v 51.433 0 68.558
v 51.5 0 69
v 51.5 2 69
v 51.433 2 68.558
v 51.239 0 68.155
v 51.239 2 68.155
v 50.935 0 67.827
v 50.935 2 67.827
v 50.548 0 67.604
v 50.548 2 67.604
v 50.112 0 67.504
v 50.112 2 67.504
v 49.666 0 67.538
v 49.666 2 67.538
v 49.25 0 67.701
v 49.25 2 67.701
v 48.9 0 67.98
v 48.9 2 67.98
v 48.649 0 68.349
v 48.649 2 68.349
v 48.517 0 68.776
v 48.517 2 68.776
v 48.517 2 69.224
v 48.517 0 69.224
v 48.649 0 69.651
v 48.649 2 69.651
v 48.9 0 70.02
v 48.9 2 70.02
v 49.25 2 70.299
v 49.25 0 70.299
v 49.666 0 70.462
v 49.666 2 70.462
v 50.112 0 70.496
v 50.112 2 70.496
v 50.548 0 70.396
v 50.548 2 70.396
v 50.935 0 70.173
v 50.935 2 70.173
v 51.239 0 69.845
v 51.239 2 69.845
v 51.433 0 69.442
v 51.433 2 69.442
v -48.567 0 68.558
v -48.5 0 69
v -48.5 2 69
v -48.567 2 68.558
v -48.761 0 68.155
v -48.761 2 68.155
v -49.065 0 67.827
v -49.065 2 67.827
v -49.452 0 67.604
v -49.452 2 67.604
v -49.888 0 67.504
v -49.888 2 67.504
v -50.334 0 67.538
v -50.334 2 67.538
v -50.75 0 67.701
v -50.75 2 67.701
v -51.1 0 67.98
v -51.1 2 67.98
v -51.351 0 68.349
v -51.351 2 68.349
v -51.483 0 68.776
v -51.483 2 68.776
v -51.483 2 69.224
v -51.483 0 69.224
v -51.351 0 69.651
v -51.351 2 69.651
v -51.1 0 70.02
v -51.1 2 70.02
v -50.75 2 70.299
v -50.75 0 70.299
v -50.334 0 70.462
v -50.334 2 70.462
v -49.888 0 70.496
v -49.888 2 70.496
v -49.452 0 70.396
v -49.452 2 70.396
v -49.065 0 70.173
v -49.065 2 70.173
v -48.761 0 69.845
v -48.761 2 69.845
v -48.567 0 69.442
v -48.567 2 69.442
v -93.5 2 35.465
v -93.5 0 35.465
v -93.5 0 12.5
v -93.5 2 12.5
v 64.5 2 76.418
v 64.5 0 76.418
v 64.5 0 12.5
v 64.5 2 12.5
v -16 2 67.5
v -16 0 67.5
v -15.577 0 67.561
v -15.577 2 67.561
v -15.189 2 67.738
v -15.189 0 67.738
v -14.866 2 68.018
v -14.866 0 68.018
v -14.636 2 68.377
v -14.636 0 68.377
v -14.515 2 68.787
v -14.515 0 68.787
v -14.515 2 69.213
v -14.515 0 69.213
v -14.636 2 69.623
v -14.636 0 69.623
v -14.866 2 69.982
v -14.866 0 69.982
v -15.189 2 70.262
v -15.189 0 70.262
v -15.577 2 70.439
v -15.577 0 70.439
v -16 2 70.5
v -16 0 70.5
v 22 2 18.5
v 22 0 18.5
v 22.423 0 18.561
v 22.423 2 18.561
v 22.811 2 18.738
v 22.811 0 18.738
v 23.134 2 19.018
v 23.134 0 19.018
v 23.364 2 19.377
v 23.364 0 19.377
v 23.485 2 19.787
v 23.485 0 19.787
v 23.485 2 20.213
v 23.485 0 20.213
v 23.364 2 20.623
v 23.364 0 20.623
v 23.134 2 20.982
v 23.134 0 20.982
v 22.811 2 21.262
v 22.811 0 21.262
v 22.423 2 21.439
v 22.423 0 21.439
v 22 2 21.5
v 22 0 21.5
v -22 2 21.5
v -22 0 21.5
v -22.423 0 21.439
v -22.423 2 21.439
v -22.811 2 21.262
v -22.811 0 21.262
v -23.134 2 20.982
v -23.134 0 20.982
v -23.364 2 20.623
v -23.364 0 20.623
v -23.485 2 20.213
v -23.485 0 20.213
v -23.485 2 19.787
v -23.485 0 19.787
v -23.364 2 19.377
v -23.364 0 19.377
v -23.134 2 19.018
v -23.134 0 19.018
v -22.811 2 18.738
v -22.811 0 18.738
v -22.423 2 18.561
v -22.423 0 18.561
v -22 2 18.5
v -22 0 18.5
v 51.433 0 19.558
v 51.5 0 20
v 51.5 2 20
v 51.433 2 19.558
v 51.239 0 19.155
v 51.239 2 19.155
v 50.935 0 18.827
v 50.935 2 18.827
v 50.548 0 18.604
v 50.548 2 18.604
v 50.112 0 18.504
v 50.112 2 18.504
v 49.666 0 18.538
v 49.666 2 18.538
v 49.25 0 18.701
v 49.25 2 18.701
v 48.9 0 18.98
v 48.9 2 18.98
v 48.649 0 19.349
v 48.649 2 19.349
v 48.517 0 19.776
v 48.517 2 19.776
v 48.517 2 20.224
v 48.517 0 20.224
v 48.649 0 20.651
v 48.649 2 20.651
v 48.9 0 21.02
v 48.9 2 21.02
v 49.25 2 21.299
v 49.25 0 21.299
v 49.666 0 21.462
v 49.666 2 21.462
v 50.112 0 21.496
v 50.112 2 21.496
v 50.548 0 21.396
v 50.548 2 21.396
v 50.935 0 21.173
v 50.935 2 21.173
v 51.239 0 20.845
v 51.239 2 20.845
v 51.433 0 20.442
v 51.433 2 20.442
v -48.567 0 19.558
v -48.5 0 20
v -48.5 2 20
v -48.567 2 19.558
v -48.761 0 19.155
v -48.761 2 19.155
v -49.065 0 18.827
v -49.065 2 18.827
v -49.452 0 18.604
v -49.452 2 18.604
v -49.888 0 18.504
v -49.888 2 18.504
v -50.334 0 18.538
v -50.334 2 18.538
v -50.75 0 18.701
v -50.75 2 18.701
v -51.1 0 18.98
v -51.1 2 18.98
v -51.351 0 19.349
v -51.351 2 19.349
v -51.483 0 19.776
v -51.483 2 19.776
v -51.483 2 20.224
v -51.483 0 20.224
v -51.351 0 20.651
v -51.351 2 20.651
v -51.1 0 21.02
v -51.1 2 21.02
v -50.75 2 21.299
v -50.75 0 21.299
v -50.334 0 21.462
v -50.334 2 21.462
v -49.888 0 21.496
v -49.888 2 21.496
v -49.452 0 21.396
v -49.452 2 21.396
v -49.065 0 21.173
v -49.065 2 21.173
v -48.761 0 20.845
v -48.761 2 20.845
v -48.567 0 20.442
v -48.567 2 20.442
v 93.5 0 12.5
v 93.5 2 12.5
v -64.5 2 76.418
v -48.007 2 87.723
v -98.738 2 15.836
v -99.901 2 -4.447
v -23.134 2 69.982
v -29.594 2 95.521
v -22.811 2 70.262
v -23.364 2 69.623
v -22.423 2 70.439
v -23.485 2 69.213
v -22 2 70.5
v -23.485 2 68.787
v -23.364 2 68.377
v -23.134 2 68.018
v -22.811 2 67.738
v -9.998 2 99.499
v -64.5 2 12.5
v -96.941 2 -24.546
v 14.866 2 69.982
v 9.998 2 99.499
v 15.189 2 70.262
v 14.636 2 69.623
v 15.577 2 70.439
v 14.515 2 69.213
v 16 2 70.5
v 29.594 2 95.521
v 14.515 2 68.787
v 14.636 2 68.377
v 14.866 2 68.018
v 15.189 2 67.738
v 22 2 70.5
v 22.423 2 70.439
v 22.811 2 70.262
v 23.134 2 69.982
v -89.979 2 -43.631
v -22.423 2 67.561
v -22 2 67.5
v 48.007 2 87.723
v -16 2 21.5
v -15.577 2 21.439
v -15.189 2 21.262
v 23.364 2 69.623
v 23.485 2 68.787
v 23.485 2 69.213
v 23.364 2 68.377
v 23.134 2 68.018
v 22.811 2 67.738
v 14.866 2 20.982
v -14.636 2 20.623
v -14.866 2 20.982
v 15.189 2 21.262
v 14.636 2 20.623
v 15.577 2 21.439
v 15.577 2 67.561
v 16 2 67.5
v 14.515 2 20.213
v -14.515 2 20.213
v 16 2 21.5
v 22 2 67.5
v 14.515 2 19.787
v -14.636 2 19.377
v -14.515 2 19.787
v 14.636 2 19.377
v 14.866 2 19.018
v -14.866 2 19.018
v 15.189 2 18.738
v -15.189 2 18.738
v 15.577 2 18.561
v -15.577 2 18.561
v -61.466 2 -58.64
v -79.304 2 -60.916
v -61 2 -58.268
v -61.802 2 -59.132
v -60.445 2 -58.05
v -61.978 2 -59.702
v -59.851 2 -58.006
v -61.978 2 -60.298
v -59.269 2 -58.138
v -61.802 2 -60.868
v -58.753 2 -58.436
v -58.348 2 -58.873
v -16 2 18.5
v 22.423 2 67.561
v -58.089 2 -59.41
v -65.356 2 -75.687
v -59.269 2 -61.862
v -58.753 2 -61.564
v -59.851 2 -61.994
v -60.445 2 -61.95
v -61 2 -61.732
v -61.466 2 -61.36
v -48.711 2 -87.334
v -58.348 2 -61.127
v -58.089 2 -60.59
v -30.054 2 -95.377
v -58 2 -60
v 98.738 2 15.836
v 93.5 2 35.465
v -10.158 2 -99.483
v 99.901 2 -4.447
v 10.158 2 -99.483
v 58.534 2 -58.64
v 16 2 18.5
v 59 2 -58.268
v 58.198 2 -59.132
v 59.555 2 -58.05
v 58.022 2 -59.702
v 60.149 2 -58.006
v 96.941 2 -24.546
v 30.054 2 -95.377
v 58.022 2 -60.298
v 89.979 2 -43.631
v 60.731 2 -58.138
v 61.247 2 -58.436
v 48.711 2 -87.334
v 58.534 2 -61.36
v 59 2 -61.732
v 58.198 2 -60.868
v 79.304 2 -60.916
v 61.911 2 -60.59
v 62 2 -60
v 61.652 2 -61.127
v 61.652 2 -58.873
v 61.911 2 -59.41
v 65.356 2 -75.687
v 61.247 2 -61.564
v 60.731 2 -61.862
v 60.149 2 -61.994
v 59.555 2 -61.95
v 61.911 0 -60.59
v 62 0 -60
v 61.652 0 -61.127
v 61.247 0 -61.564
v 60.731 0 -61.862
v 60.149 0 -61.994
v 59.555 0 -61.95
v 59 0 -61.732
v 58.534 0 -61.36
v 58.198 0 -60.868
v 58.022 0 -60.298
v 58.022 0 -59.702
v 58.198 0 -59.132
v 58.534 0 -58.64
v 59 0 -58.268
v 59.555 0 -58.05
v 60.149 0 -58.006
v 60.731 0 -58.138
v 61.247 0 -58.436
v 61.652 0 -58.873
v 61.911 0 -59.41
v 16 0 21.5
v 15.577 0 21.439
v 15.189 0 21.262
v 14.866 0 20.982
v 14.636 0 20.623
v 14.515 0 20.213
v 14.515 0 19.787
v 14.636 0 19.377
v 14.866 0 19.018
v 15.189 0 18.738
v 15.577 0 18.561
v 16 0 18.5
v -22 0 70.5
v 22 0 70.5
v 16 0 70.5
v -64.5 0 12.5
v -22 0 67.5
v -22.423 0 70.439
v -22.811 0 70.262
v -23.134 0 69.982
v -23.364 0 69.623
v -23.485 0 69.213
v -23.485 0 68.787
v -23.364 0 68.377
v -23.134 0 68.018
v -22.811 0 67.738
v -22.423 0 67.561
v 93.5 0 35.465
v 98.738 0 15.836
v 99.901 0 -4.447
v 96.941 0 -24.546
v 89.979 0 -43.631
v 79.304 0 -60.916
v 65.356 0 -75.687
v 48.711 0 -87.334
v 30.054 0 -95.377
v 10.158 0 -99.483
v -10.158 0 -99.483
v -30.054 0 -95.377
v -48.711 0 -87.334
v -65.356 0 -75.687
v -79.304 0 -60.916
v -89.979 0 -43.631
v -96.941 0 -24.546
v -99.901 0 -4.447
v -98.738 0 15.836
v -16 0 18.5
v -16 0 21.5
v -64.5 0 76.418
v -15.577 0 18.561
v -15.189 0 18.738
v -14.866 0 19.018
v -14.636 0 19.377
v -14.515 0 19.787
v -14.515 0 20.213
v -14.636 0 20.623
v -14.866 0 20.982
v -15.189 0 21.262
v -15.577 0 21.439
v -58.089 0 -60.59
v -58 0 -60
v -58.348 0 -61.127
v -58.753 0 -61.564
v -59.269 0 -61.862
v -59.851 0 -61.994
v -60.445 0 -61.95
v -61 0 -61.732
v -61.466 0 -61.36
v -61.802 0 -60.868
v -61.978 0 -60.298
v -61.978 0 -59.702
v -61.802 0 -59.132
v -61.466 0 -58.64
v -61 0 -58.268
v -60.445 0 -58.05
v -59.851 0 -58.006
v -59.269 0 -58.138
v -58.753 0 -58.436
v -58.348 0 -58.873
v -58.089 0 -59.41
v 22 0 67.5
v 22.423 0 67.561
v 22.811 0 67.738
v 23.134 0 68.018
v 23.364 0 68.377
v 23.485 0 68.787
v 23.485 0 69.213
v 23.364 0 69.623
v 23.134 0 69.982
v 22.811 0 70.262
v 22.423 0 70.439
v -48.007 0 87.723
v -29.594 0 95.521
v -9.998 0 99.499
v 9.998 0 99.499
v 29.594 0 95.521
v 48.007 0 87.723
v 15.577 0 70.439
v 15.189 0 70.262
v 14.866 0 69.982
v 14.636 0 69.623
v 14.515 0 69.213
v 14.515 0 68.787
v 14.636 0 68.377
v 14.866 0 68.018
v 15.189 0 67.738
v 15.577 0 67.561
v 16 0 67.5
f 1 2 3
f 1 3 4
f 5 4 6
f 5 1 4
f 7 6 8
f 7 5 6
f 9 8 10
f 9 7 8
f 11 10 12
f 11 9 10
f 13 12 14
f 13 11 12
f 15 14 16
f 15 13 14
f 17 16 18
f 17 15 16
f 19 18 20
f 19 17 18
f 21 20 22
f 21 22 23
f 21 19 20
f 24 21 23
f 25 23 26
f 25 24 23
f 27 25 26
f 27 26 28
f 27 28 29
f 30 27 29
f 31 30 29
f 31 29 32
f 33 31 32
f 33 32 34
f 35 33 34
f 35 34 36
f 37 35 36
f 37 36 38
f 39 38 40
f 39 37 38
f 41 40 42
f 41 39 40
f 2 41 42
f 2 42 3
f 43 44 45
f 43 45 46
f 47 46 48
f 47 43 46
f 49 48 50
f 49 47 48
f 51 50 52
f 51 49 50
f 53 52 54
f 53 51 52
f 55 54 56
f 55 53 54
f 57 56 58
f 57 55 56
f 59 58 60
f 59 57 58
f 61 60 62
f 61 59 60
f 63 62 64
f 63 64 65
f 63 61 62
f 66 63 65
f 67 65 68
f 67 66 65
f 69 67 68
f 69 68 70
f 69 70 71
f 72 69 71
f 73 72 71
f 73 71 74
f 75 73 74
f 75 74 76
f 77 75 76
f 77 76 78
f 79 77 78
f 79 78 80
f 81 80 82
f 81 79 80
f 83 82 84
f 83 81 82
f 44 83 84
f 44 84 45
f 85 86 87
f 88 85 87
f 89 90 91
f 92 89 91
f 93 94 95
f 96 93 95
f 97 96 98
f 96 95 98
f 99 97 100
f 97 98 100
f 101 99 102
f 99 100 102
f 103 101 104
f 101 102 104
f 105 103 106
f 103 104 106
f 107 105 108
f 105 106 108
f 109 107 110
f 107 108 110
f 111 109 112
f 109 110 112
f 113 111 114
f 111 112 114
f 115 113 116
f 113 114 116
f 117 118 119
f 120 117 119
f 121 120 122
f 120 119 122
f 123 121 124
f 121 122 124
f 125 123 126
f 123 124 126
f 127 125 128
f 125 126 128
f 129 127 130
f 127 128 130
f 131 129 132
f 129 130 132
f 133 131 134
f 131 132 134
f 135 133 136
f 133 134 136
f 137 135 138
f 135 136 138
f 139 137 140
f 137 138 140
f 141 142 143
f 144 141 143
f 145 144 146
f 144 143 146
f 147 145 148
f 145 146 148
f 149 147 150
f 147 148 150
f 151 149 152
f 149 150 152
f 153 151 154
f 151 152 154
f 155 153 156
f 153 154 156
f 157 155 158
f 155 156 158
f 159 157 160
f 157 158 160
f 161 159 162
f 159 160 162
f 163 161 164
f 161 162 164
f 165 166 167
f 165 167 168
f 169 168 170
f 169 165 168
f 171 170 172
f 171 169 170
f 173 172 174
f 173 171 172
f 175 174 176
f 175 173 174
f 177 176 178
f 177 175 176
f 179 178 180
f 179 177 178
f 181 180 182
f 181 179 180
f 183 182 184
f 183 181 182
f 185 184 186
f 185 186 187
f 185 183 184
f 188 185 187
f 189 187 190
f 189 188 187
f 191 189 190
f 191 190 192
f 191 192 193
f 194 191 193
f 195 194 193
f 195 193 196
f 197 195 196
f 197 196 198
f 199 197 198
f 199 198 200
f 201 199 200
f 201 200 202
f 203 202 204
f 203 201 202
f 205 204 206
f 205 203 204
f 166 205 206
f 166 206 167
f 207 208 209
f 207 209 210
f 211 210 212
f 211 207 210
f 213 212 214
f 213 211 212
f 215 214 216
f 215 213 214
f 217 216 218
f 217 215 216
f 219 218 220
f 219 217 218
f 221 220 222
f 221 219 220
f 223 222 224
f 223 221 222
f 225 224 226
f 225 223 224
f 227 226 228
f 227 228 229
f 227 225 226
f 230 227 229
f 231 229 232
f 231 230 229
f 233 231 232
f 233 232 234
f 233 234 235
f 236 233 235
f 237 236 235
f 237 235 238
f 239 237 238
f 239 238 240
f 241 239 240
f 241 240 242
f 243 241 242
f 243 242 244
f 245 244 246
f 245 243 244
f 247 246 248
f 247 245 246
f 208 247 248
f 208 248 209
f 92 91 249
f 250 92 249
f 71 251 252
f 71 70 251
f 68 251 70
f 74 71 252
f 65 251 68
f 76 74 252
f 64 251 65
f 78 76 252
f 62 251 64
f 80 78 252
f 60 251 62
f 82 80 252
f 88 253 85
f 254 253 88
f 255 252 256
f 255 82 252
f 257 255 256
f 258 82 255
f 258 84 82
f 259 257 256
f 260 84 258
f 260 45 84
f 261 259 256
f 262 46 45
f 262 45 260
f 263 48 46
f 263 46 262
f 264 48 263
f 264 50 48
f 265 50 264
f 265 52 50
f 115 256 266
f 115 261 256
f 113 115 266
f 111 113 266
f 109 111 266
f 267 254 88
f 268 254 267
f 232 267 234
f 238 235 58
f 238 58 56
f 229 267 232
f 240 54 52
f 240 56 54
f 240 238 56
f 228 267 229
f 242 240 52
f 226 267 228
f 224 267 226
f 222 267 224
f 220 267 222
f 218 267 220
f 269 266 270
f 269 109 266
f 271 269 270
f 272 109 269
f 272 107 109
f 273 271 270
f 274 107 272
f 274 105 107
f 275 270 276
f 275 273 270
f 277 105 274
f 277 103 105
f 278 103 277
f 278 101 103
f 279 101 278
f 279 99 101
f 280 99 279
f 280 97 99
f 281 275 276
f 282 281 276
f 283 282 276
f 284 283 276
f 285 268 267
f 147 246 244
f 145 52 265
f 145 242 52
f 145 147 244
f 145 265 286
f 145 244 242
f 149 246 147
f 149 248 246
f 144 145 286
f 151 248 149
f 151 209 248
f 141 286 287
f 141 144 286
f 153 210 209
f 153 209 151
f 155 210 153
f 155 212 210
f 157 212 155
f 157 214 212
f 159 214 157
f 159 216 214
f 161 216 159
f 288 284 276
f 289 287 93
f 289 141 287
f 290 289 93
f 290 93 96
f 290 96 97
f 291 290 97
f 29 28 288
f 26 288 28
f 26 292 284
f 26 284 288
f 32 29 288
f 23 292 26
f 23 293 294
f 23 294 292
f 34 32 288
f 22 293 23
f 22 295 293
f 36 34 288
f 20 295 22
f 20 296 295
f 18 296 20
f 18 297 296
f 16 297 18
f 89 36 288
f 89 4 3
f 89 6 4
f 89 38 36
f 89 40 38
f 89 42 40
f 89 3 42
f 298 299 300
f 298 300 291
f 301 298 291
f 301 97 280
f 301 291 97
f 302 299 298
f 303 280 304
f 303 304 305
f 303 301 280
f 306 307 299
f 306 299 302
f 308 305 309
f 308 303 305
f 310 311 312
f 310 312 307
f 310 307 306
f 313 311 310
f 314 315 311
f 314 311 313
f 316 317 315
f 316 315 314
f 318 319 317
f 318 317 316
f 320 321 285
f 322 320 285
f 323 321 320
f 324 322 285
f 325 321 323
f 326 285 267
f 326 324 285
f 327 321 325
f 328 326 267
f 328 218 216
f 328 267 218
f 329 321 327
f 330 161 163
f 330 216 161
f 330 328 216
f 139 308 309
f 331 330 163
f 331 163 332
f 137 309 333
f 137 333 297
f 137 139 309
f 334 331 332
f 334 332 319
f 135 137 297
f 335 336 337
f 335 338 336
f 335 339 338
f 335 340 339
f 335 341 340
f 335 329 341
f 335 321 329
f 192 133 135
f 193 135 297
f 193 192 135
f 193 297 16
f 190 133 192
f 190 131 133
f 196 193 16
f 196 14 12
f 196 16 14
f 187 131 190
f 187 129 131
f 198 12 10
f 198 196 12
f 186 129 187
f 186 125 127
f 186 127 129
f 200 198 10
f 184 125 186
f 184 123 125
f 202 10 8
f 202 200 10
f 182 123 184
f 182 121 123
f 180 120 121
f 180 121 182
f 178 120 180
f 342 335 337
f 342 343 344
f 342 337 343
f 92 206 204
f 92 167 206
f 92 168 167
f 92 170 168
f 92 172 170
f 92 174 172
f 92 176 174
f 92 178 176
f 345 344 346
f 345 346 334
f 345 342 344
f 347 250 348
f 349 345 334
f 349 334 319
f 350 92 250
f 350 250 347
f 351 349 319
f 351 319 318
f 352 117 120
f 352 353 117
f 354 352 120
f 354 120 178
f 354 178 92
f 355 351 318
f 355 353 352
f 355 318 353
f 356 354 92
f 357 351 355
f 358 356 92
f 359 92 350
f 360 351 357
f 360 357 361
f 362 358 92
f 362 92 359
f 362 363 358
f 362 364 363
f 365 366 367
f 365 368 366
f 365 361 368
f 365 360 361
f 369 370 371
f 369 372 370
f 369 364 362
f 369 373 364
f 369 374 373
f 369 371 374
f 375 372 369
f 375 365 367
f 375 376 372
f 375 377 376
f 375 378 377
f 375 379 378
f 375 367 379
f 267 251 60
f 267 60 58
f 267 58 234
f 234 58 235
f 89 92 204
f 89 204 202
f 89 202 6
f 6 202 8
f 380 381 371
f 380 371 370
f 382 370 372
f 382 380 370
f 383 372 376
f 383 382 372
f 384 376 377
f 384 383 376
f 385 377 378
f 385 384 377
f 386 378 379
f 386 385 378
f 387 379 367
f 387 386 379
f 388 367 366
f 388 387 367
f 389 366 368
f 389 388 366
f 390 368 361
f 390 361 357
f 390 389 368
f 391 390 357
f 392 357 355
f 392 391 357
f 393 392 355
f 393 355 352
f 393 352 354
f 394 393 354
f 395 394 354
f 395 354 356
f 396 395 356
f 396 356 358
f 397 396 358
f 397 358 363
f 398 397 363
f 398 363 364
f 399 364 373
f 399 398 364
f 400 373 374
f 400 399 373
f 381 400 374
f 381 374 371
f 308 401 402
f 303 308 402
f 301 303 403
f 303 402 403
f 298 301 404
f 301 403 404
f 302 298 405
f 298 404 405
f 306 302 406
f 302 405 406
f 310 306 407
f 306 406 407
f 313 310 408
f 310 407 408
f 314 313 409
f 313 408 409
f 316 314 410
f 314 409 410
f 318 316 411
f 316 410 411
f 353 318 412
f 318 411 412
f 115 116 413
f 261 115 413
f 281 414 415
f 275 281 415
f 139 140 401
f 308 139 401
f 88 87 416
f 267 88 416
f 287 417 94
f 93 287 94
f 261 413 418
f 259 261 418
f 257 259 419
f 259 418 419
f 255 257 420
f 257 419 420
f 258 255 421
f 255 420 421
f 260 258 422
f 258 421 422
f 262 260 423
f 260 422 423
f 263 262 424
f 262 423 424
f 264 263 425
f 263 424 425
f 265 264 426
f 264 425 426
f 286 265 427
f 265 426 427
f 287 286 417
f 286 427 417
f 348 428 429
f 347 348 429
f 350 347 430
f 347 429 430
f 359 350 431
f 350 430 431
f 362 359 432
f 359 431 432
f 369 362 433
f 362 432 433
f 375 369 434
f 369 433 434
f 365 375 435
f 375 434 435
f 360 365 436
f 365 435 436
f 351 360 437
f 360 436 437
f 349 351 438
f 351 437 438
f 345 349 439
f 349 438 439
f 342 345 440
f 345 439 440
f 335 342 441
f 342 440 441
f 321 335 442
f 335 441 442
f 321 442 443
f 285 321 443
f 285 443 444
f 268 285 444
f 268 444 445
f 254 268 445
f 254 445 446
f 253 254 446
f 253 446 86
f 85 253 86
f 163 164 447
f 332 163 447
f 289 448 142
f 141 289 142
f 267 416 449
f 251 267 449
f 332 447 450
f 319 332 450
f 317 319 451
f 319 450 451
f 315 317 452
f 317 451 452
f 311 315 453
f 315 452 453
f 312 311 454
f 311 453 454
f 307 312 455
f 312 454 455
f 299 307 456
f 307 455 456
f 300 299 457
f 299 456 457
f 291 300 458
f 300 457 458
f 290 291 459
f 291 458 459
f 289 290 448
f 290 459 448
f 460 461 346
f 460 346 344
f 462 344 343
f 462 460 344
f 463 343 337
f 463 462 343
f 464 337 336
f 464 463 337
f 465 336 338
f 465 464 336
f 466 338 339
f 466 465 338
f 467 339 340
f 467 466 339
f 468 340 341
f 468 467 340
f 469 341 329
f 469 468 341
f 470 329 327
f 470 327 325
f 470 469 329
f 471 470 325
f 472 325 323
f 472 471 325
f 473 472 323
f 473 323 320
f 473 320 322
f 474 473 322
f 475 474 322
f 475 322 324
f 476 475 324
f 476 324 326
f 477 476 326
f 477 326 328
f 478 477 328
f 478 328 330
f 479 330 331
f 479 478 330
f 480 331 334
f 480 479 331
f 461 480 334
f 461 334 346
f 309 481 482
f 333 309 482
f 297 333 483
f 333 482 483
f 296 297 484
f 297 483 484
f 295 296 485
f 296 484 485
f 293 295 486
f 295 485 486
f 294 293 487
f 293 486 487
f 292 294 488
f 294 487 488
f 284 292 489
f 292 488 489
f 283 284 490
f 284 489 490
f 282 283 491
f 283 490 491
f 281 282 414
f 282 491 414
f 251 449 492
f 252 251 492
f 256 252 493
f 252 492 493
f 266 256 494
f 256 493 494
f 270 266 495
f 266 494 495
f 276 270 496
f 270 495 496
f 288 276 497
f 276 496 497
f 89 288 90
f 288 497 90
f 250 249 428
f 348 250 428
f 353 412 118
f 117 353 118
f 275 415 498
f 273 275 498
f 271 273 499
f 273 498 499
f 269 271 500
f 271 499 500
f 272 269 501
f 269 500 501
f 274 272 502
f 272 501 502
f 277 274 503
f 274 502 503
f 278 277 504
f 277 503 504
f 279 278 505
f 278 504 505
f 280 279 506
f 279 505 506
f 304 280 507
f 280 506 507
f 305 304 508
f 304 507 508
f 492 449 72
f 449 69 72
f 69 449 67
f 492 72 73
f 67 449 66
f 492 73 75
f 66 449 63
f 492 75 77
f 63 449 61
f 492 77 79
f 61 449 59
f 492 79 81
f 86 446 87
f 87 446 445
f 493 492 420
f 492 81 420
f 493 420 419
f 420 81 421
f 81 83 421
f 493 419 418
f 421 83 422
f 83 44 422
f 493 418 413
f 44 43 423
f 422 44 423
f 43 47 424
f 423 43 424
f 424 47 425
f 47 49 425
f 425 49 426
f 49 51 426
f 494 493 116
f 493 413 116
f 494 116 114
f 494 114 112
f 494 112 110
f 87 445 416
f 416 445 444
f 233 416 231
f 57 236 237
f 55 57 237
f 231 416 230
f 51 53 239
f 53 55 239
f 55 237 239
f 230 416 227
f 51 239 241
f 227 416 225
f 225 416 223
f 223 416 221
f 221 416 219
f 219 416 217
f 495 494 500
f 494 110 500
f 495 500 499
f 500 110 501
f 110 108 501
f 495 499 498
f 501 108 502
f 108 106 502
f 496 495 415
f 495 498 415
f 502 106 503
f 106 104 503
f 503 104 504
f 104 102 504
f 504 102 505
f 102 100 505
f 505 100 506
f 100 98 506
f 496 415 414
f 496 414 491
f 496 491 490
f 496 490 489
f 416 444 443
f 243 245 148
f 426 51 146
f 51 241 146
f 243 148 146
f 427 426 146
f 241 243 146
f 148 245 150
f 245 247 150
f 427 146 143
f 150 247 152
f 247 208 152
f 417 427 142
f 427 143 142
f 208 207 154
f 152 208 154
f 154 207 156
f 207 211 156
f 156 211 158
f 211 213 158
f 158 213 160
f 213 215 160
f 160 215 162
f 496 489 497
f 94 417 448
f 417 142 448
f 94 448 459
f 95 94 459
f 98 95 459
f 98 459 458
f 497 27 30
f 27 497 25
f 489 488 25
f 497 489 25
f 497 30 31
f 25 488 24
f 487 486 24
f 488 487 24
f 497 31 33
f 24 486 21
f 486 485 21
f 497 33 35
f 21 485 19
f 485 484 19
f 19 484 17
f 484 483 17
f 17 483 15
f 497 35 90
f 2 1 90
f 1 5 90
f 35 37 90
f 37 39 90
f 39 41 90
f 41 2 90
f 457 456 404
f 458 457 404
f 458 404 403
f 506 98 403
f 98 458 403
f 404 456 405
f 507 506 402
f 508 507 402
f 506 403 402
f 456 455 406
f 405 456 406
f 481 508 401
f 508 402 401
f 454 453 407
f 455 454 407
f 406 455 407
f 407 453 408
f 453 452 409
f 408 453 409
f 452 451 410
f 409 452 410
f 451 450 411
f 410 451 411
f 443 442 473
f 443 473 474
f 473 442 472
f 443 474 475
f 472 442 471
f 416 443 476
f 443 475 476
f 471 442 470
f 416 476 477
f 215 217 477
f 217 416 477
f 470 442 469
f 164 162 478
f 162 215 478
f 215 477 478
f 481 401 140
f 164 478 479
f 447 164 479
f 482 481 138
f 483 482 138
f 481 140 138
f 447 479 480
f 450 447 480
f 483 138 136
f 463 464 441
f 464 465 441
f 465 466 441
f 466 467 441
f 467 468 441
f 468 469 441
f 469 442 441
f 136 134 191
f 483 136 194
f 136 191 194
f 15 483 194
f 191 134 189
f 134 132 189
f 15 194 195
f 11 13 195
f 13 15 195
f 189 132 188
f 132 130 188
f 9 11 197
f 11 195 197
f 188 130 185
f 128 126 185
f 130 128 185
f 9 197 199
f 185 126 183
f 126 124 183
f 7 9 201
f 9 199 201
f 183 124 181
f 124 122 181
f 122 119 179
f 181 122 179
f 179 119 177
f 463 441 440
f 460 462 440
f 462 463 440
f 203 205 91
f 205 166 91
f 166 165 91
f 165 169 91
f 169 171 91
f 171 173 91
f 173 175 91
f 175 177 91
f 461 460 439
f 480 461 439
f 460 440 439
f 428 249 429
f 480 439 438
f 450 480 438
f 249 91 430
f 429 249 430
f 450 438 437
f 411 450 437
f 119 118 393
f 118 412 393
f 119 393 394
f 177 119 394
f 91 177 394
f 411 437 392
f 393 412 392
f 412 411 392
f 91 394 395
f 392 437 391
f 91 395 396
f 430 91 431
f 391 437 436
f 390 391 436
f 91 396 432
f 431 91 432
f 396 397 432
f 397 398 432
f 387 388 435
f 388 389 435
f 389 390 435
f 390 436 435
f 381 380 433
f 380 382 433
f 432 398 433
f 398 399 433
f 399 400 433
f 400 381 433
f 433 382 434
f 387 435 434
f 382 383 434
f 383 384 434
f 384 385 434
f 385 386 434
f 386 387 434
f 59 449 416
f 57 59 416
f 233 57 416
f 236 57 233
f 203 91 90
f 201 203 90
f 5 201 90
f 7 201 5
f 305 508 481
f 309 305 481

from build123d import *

# Parameters (mm, degrees)
SKETCH1_R           = 1.5
SKETCH1_R_2         = 2
BOSS_EXTRUDE1_DEPTH = 2


with BuildPart() as part:
    # Sketch1 → Boss-Extrude1 (new body)
    with BuildSketch(Plane(origin=(0, 0, 0), x_dir=(1, 0, 0), z_dir=(0, 1, 0))):
        with BuildLine():
            Line((-93.5, -35.464771253), (-93.5, -12.5))
            Line((-93.5, -12.5), (-64.5, -12.5))
            Line((-64.5, -12.5), (-64.5, -76.418256981))
            ThreePointArc((-64.5, -76.418256981), (0, -100), (64.5, -76.418256981))
            Line((64.5, -76.418256981), (64.5, -12.5))
            Line((64.5, -12.5), (93.5, -12.5))
            Line((93.5, -12.5), (93.5, -35.464771253))
            ThreePointArc((93.5, -35.464771253), (0, 100), (-93.5, -35.464771253))
        make_face()
        with Locations((-50, -69)):
            Circle(SKETCH1_R, mode=Mode.SUBTRACT)
        with BuildLine():
            Line((-22, -67.5), (-16, -67.5))
            ThreePointArc((-16, -67.5), (-14.5, -69), (-16, -70.5))
            Line((-16, -70.5), (-22, -70.5))
            ThreePointArc((-22, -70.5), (-23.5, -69), (-22, -67.5))
        make_face(mode=Mode.SUBTRACT)
        with Locations((-50, -20)):
            Circle(SKETCH1_R, mode=Mode.SUBTRACT)
        with BuildLine():
            ThreePointArc((-16, -18.5), (-14.5, -20), (-16, -21.5))
            Line((-16, -21.5), (-22, -21.5))
            ThreePointArc((-22, -21.5), (-23.5, -20), (-22, -18.5))
            Line((-22, -18.5), (-16, -18.5))
        make_face(mode=Mode.SUBTRACT)
        with BuildLine():
            ThreePointArc((16, -70.5), (14.5, -69), (16, -67.5))
            Line((16, -67.5), (22, -67.5))
            ThreePointArc((22, -67.5), (23.5, -69), (22, -70.5))
            Line((22, -70.5), (16, -70.5))
        make_face(mode=Mode.SUBTRACT)
        with Locations((50, -69)):
            Circle(SKETCH1_R, mode=Mode.SUBTRACT)
        with BuildLine():
            Line((22, -21.5), (16, -21.5))
            ThreePointArc((16, -21.5), (14.5, -20), (16, -18.5))
            Line((16, -18.5), (22, -18.5))
            ThreePointArc((22, -18.5), (23.5, -20), (22, -21.5))
        make_face(mode=Mode.SUBTRACT)
        with Locations((50, -20)):
            Circle(SKETCH1_R, mode=Mode.SUBTRACT)
        with Locations((-60, 60)):
            Circle(SKETCH1_R_2, mode=Mode.SUBTRACT)
        with Locations((60, 60)):
            Circle(SKETCH1_R_2, mode=Mode.SUBTRACT)
    extrude(amount=BOSS_EXTRUDE1_DEPTH)


solid = part.part
